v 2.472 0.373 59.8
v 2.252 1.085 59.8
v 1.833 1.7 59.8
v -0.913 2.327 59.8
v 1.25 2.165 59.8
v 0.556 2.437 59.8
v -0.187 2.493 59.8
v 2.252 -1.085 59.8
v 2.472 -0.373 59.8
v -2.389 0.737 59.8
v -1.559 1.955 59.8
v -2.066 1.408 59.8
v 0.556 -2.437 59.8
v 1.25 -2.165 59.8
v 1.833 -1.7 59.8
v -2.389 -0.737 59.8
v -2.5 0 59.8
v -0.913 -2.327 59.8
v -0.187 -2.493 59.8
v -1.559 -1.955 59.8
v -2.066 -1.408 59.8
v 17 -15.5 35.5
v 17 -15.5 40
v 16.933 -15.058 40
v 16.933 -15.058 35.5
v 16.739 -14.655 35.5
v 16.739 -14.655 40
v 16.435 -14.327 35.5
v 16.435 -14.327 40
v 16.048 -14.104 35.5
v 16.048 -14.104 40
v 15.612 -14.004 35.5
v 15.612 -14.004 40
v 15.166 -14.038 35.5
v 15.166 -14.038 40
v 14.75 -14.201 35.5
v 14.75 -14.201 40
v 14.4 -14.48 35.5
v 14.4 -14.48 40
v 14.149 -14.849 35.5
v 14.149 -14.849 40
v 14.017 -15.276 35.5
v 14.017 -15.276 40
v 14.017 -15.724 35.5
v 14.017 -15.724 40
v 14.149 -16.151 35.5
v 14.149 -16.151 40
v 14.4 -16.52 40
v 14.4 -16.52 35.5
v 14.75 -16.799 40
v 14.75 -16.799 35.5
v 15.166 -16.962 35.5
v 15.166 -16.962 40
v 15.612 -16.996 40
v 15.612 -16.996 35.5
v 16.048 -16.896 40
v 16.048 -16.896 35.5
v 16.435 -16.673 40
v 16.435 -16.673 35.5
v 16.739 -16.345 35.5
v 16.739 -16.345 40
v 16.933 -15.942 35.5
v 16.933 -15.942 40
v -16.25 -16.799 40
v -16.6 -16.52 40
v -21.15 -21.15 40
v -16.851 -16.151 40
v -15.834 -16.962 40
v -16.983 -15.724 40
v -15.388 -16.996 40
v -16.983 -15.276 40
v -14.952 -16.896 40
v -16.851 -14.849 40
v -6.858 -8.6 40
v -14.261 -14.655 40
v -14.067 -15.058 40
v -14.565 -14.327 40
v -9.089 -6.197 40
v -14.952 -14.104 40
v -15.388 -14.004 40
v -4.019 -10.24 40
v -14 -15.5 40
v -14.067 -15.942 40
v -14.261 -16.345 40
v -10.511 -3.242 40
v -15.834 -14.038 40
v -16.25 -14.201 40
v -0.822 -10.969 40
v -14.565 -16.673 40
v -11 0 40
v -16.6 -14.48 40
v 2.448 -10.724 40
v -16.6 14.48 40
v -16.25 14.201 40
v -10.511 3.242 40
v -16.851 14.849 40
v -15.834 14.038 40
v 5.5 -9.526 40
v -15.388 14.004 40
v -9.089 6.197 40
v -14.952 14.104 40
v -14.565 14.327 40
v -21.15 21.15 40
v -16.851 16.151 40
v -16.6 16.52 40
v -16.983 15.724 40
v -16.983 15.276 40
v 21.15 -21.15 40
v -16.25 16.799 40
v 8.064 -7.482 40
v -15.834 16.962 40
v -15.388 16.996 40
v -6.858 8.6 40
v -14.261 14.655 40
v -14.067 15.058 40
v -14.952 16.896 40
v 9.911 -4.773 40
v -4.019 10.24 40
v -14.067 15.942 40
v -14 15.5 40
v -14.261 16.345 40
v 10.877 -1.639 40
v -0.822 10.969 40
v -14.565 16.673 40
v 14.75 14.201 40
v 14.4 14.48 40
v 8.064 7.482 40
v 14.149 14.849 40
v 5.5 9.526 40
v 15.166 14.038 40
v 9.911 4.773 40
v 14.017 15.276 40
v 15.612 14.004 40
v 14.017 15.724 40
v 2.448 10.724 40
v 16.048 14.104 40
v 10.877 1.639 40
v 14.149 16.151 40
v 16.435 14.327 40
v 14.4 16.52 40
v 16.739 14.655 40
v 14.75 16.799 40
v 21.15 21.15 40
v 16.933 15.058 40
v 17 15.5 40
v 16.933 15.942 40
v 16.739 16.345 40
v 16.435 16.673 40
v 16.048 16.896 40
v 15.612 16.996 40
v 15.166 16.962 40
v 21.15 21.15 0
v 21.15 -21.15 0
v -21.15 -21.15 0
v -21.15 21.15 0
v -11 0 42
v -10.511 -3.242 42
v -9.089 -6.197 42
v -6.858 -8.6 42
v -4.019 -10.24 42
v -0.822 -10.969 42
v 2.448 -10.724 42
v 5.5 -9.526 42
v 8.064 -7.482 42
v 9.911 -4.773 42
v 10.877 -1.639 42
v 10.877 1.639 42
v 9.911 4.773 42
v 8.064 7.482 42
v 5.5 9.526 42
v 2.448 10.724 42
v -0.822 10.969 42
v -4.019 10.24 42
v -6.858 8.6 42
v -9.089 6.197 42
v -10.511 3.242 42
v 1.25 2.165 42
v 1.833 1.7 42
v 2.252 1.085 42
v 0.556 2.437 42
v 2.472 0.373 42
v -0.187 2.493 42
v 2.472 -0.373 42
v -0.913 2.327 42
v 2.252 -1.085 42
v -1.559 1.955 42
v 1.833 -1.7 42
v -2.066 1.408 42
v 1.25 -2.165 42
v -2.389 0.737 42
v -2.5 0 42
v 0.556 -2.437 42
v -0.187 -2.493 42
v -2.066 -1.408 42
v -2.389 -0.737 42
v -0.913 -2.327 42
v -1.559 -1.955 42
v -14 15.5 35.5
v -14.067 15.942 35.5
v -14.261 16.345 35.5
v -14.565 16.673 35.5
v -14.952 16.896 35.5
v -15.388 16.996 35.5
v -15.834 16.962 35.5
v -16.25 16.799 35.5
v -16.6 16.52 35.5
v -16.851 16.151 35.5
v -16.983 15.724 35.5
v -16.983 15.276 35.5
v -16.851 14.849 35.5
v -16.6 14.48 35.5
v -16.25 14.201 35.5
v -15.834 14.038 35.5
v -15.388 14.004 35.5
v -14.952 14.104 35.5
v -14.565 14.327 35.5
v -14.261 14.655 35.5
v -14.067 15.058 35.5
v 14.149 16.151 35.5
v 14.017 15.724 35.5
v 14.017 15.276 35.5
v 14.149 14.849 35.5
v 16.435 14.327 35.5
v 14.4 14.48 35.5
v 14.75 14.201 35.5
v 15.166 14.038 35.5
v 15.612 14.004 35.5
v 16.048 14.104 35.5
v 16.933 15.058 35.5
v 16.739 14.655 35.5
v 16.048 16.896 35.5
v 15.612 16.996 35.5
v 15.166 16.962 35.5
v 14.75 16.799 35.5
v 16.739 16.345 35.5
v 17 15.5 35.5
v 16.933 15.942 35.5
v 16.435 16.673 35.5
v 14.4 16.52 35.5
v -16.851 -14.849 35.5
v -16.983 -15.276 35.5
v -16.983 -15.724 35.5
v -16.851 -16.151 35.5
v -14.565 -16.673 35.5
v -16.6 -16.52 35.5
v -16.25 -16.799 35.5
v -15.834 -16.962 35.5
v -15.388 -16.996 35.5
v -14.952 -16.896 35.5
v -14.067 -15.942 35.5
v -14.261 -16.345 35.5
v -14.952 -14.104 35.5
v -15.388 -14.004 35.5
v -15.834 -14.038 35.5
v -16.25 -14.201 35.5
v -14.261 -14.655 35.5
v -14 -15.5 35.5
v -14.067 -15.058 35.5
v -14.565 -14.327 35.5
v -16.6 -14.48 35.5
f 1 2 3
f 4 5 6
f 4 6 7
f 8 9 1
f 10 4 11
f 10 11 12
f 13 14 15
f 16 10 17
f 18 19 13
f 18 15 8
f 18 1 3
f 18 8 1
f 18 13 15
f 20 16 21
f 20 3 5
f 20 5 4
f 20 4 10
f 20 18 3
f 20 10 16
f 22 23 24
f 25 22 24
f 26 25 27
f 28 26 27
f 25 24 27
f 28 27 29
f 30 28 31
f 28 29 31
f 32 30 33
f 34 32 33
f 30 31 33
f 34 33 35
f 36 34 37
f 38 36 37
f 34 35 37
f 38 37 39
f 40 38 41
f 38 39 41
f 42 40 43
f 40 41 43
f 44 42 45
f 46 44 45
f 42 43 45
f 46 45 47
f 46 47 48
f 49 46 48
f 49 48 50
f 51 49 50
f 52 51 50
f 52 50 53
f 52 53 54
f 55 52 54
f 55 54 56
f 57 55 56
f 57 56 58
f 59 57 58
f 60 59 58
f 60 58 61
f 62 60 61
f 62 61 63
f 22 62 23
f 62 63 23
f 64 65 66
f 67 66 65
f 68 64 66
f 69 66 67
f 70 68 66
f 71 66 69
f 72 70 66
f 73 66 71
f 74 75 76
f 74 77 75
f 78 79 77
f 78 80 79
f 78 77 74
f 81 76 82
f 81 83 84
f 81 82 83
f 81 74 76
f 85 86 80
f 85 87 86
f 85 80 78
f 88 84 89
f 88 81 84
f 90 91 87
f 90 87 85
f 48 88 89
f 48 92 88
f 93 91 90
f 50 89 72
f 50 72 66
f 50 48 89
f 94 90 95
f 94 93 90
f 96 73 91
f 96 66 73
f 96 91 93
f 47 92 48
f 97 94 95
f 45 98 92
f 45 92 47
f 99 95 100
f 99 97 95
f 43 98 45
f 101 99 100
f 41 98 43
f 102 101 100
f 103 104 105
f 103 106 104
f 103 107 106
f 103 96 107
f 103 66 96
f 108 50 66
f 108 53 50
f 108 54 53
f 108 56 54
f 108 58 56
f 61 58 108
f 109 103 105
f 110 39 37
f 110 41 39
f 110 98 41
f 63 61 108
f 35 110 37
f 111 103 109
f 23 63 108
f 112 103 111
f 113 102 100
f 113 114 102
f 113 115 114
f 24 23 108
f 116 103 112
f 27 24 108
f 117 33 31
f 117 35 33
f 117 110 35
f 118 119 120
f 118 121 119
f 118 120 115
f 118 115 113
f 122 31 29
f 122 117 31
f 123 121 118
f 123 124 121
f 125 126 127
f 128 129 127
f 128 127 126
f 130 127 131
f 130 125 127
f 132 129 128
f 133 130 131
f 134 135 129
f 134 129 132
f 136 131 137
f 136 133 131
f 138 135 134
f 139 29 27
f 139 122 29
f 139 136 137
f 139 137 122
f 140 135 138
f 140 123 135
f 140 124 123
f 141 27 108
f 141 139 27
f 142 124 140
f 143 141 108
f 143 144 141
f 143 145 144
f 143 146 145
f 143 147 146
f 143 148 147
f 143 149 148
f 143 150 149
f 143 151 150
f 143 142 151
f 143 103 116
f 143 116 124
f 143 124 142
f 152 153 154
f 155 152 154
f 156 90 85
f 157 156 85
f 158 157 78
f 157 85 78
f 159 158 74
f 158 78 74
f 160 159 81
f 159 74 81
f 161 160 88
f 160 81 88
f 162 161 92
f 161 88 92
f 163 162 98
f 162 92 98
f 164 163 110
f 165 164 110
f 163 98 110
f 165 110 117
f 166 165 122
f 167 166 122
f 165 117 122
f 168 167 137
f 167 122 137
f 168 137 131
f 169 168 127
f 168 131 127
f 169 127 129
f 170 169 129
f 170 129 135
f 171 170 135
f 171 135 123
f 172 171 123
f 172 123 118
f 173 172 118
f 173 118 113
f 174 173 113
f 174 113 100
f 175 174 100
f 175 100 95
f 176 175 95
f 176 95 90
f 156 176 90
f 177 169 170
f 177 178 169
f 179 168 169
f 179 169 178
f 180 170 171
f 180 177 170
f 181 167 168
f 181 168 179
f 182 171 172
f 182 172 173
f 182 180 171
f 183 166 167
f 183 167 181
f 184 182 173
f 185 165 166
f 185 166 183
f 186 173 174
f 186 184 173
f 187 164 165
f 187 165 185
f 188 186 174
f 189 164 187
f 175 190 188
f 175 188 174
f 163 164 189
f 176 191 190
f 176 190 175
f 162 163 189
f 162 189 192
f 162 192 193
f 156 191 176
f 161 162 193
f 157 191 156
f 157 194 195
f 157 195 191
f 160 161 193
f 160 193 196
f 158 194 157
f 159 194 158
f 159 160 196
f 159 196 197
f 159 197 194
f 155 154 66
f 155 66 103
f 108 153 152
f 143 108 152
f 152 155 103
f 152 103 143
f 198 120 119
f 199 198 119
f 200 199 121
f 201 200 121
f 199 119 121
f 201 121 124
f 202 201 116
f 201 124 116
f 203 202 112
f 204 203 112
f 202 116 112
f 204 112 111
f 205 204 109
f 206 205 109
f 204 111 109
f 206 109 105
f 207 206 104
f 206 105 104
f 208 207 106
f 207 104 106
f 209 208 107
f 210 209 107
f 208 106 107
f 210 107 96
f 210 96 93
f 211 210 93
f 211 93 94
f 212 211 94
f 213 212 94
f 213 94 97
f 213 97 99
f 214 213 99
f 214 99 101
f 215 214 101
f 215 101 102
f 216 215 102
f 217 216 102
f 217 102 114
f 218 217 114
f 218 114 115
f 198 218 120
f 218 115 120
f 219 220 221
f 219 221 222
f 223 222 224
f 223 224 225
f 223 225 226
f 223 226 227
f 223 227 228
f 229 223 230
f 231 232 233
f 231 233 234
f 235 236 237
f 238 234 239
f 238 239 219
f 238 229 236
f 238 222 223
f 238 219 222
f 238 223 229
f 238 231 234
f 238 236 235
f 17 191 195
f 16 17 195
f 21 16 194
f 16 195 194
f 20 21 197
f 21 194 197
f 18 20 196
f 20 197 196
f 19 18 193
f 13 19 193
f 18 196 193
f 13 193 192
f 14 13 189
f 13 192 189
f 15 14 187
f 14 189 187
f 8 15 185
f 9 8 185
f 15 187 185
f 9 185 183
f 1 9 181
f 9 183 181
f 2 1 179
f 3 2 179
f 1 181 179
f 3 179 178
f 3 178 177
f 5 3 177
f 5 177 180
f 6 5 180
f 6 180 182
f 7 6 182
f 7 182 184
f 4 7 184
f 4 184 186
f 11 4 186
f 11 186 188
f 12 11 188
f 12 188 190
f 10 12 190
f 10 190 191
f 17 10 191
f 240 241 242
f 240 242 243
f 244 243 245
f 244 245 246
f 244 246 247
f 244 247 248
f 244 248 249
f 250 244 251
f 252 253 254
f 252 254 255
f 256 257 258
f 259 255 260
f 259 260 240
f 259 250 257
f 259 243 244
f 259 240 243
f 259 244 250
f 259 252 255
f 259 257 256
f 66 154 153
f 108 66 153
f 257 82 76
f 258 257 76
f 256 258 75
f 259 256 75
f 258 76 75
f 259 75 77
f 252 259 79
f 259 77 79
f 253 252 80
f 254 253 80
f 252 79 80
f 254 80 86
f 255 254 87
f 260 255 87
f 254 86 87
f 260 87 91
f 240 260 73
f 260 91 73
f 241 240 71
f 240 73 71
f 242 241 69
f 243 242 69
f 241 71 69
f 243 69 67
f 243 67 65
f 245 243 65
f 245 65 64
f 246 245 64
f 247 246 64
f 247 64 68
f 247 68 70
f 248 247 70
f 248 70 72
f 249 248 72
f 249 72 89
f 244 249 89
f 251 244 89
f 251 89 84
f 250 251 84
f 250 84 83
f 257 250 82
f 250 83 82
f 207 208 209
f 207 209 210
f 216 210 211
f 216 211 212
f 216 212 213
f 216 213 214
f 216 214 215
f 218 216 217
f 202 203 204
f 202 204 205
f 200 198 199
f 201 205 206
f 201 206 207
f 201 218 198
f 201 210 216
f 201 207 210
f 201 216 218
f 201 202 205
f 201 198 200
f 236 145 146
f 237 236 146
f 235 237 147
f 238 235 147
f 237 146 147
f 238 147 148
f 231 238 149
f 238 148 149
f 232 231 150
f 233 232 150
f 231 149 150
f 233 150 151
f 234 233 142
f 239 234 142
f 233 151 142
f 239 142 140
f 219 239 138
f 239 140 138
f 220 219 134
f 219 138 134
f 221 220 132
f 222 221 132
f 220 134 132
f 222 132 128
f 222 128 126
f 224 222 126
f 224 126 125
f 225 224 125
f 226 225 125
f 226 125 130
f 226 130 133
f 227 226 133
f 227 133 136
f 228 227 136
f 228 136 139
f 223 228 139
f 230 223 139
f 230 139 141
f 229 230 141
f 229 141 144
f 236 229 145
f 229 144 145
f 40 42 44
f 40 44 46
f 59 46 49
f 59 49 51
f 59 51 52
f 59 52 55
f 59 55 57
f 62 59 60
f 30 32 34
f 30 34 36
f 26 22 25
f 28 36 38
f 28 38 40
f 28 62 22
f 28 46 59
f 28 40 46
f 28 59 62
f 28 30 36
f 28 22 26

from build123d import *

# Parameters (mm, degrees)
SKETCH_1_W          = 42.3
SKETCH_1_H          = 42.3
EXTRUDE_1533_DEPTH  = 40
SKETCH_2_R          = 2.5
EXTRUDE_1588_DEPTH  = 59.8
SKETCH_3_R          = 11
EXTRUDE_1635_DEPTH  = 42
CUT_EXTRUDE_START   = 40
SKETCH_5_R          = 1.5
CUT_EXTRUDE_3_DEPTH = 4.5


with BuildPart() as part:
    # Эскиз1 → Extrude 1533 (new body)
    with BuildSketch(Plane.XY):
        Rectangle(SKETCH_1_W, SKETCH_1_H)
    extrude(amount=EXTRUDE_1533_DEPTH)

    # Эскиз2 → Extrude 1588 (add)
    with BuildSketch(Plane.XY):
        with Locations(Location((0, 0, 0), (0, 0, 180))):
            Circle(SKETCH_2_R)
    extrude(amount=EXTRUDE_1588_DEPTH)

    # Эскиз3 → Extrude 1635 (add)
    with BuildSketch(Plane.XY):
        with Locations(Location((0, 0, 0), (0, 0, 180))):
            Circle(SKETCH_3_R)
    extrude(amount=EXTRUDE_1635_DEPTH)

    # Эскиз5 → Крепеж_М3_ПРЕДВ (cut)
    with BuildSketch(Plane.XY.offset(CUT_EXTRUDE_START)):
        with Locations((-15.5, -15.5)):
            Circle(SKETCH_5_R)
        with Locations((-15.5, 15.5)):
            Circle(SKETCH_5_R)
        with Locations((15.5, -15.5)):
            Circle(SKETCH_5_R)
        with Locations((15.5, 15.5)):
            Circle(SKETCH_5_R)
    extrude(amount=-CUT_EXTRUDE_3_DEPTH, mode=Mode.SUBTRACT)


solid = part.part
